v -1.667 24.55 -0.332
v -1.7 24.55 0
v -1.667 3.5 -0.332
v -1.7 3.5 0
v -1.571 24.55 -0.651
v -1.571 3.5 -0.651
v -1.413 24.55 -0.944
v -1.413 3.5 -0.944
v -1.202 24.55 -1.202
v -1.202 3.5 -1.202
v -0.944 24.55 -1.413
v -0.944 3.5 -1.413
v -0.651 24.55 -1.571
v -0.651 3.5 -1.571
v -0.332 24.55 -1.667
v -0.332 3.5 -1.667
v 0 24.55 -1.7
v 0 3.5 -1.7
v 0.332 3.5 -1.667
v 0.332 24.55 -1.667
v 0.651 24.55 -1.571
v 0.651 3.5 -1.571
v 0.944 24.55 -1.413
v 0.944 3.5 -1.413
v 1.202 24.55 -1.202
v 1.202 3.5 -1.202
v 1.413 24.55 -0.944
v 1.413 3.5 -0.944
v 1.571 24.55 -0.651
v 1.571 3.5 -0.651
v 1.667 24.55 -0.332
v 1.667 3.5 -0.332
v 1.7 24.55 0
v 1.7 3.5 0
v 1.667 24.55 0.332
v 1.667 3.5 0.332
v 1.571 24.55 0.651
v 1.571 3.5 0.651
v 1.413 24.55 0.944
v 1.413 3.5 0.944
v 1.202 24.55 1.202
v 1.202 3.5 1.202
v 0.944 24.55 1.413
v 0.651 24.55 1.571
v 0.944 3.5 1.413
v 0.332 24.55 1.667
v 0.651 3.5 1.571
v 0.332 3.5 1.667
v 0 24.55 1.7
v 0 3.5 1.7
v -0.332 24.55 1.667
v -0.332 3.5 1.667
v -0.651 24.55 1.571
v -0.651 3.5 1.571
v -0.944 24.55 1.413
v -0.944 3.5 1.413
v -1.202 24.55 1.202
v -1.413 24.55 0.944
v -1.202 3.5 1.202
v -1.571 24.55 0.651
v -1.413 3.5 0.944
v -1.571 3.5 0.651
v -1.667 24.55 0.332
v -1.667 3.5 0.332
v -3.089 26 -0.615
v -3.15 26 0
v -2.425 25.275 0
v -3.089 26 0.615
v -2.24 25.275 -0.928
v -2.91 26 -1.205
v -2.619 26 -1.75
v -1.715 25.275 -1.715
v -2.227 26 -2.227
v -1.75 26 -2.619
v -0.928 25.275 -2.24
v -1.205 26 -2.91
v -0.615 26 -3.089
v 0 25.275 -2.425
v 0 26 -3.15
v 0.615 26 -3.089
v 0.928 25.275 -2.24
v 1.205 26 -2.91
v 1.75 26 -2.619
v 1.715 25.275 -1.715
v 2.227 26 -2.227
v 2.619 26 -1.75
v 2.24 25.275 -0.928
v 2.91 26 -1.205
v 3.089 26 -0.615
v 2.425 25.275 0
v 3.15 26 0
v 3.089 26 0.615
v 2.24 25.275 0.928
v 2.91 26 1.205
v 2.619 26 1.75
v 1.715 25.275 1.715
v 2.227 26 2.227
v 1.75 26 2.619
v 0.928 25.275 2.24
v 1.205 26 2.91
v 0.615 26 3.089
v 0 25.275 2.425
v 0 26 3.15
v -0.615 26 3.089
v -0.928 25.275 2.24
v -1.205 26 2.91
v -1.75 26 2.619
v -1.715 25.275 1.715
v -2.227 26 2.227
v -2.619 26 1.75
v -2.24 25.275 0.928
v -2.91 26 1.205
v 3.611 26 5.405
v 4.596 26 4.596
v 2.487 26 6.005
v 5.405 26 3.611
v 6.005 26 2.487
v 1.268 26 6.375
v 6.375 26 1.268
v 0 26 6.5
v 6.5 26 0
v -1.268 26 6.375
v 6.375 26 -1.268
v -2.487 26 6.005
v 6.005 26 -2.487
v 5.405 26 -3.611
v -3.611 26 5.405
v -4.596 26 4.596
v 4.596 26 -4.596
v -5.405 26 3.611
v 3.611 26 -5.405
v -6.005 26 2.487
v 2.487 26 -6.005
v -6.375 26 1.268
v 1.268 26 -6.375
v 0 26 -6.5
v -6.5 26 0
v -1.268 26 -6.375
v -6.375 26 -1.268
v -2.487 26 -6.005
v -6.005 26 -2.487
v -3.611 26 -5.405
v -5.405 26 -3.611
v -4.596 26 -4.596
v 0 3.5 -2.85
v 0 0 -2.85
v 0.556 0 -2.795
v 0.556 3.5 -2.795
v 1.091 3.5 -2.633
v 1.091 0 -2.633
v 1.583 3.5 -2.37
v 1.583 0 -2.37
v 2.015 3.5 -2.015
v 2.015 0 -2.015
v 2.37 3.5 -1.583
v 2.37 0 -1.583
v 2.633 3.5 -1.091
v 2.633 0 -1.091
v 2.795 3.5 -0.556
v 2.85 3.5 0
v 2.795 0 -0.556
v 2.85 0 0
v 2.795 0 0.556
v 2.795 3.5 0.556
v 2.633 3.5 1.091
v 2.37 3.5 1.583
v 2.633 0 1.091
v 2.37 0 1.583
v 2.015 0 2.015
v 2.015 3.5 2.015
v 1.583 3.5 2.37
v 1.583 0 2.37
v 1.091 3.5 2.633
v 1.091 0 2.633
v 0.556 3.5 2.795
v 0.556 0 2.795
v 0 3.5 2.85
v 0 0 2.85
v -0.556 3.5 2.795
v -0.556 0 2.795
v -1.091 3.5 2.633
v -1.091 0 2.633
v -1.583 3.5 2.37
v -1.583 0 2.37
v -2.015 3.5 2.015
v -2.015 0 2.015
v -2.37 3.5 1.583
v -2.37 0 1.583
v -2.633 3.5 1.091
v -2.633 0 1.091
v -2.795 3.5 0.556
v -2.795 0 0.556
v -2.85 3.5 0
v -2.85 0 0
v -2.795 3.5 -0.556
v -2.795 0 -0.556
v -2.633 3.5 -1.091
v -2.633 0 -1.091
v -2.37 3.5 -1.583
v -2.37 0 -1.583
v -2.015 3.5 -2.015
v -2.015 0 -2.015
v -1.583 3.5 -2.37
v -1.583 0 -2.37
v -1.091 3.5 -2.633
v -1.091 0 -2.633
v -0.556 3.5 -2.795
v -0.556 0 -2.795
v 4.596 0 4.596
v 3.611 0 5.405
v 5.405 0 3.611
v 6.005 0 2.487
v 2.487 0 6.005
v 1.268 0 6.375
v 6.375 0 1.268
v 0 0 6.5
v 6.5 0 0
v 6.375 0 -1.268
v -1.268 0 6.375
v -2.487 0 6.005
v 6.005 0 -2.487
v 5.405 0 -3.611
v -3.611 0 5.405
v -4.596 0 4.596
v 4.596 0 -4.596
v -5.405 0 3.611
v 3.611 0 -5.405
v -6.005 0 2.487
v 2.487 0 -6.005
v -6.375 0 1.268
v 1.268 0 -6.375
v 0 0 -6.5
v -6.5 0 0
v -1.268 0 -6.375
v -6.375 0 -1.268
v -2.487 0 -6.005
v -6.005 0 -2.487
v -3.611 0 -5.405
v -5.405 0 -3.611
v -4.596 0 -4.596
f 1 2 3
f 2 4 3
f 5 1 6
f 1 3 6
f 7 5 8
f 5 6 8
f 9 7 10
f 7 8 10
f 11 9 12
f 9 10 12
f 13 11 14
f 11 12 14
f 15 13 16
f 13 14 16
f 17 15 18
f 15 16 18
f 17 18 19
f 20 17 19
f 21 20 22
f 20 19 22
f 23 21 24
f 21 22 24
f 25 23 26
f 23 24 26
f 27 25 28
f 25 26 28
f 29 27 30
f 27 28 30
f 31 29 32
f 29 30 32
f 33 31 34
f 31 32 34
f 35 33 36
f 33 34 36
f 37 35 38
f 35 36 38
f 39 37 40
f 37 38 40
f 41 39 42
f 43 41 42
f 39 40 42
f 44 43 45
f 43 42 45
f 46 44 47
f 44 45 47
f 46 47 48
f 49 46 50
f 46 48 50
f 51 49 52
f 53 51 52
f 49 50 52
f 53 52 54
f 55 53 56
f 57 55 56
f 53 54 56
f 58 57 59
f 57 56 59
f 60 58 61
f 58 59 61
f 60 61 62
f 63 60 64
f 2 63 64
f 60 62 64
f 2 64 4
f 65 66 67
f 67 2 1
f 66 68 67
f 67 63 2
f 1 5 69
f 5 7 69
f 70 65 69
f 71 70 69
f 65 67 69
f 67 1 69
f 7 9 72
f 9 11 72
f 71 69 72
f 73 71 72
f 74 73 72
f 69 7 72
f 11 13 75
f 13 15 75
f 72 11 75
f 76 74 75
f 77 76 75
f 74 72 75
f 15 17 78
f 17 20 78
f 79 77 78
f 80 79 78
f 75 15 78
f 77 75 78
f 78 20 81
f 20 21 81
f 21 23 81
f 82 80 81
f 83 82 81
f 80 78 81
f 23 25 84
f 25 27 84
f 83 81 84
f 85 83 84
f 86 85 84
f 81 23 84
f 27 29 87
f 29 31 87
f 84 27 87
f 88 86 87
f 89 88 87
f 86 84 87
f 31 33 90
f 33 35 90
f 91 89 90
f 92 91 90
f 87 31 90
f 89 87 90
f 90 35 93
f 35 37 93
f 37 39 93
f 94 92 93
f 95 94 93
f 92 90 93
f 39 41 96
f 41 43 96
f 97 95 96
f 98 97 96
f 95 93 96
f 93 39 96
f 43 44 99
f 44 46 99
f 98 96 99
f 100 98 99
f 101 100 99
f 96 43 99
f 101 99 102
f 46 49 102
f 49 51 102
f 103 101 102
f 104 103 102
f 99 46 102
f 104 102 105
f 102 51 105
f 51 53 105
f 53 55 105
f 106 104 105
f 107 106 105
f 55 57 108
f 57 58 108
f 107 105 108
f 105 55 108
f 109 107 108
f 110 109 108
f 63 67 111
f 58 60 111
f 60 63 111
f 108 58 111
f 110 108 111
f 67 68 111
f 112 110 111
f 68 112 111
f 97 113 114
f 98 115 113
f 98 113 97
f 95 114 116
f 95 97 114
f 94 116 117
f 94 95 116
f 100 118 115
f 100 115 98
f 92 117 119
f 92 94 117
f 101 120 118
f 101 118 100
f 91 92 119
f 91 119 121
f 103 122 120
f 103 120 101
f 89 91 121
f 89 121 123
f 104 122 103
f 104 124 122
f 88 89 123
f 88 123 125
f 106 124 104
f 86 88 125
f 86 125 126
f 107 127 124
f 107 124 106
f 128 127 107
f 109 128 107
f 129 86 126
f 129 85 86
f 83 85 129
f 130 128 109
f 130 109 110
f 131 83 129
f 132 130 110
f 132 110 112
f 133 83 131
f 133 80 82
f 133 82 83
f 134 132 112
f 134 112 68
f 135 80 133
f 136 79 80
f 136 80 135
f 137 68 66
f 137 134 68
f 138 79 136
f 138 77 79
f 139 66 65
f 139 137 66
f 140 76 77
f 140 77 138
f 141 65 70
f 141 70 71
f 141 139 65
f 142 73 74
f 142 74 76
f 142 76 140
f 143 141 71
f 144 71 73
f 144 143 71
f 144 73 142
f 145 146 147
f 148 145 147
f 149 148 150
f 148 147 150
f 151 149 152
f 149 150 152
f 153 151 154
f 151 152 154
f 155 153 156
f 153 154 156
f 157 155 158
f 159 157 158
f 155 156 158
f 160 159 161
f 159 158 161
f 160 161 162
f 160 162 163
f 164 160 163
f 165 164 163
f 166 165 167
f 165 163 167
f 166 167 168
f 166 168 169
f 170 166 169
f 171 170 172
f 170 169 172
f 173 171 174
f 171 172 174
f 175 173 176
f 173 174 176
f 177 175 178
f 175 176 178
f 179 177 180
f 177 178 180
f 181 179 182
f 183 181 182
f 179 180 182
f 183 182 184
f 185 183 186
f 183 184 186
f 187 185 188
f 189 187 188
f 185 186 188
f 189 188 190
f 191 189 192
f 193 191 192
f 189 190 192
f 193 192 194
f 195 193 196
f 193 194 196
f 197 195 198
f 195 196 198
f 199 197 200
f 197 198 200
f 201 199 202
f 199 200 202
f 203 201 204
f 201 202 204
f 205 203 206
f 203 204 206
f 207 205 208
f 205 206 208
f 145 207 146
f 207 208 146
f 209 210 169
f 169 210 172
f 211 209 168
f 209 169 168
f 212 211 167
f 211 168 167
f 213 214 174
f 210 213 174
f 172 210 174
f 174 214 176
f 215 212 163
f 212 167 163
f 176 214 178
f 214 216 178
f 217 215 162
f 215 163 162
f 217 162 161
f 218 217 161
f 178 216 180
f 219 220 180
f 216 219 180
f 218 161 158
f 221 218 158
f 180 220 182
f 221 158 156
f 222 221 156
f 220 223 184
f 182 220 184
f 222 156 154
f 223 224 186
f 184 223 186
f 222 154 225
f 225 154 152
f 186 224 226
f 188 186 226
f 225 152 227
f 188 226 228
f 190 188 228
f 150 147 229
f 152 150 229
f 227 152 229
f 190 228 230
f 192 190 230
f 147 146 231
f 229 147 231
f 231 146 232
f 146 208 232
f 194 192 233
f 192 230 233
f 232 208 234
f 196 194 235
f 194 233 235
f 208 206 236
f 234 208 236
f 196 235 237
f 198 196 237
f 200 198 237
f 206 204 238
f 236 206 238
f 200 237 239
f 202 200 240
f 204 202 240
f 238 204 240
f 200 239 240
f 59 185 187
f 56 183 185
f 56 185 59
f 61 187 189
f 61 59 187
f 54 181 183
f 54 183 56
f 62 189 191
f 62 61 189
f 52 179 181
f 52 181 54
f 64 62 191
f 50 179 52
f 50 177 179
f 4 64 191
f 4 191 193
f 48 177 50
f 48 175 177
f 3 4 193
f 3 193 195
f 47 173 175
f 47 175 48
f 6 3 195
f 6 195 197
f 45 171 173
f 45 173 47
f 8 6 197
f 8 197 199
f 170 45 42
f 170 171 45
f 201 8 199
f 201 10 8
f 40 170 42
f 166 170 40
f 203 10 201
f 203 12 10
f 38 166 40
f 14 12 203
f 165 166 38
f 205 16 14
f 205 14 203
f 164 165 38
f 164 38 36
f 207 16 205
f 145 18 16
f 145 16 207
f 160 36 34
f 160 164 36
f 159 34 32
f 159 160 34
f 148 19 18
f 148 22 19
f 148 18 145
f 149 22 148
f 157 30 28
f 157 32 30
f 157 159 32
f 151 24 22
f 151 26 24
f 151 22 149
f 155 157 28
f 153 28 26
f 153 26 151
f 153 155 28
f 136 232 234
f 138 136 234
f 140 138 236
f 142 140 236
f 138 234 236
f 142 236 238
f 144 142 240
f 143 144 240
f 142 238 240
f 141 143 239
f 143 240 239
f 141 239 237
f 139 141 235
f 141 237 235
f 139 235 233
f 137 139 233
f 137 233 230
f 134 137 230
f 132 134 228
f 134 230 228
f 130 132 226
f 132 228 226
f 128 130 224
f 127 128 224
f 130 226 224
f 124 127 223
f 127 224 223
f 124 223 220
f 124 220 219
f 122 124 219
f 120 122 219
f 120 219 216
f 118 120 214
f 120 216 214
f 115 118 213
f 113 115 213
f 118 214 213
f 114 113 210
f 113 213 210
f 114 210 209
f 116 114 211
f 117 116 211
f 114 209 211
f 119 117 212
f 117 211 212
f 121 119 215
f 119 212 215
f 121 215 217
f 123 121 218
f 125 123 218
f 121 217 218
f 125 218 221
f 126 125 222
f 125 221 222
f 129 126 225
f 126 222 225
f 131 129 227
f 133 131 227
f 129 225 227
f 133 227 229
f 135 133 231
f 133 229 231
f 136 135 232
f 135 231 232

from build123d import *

# Parameters (mm, degrees)
SKETCH_1_R                  = 6.5
EXTRUDE_1_DEPTH             = 26
SKETCH_2_R                  = 2.85
CUT_EXTRUDE_1_DEPTH         = 3.5
HOLE_WIZARD_M32_D           = 3.4
HOLE_WIZARD_M32_CSINK_D     = 6.3
HOLE_WIZARD_M32_CSINK_ANGLE = 90


with BuildPart() as part:
    # Эскиз1 → Бобышка-Вытянуть1 (new body)
    with BuildSketch(Plane(origin=(0, 0, 0), x_dir=(1, 0, 0), z_dir=(0, 1, 0))):
        with Locations(Location((0, 0, 0), (0, 0, 90))):
            Circle(SKETCH_1_R)
    extrude(amount=EXTRUDE_1_DEPTH)

    # Эскиз2 → Вырез-Вытянуть1 (cut)
    with BuildSketch(Plane.XZ):
        with Locations(Location((0, 0, 0), (0, 0, 270))):
            Circle(SKETCH_2_R)
    extrude(amount=-CUT_EXTRUDE_1_DEPTH, mode=Mode.SUBTRACT)

    # Зенковка для  винта с плоской головкой M32 (through all)
    with Locations(Plane(origin=(0, 26, 0), x_dir=(1, 0, 0), z_dir=(0, 1, 0))):
        with Locations((0, 0)):
            CounterSinkHole(HOLE_WIZARD_M32_D / 2, HOLE_WIZARD_M32_CSINK_D / 2, counter_sink_angle=HOLE_WIZARD_M32_CSINK_ANGLE)


solid = part.part
